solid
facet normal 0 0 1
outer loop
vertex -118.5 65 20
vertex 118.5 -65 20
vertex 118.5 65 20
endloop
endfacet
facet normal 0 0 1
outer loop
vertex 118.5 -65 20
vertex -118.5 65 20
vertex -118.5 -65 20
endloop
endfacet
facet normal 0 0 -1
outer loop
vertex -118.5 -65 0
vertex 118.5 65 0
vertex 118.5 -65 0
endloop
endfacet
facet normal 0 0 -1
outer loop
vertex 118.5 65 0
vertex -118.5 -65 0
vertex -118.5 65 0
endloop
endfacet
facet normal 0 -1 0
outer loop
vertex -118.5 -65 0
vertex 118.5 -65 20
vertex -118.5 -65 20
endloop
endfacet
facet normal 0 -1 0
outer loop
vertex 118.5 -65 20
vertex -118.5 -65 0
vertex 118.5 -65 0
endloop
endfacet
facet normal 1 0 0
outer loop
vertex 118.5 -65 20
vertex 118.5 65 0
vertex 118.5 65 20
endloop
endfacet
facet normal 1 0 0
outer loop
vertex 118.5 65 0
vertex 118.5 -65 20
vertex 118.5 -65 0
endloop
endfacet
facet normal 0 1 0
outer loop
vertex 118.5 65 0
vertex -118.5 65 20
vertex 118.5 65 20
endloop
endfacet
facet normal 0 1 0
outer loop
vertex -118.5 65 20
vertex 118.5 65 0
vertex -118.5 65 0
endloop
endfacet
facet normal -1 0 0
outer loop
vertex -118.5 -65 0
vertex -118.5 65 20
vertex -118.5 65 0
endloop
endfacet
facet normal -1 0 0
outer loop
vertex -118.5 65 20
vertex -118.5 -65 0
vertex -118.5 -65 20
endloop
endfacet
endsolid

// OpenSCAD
// BASE

base_hight = 20;

// positionnig
translate([0,0,base_hight/2]){

    color("yellow", 1.0){
        cube([237, 130, base_hight], center = true);
    }   
}

// EXTRUDER HOLDER

    square_size = 40;
    hole_offset = 0;
    circle_size = 4.55;


// positionning
translate([0,0,base_hight]){

    difference(){
    color("blue", 1.0){
        //base 
        square(square_size, center = true);


        

        //side
        translate([(square_size/2)-0.5,0,(square_size/2)-0.5]){
            rotate([0, 90, 0]){
                square(square_size, center = true);
            }
        }
        
    }
        // holes base
        color("yellow", 1.0){
            for(i = [0:2]){
                rotate([0,0,120*i])
                translate([11.5,0,0])
                circle(circle_size, $fn = 100);       
            }
         // holes side
            translate([(square_size/2)-0.5,0,(square_size/2)-0.5])
            rotate([0,90,0])
            
            
            for(i = [0:2]){
                rotate([0,0,120*i+30])
                translate([0,11.5,0])
                circle(circle_size, $fn = 100);       
            }
              
        }
    }
}
